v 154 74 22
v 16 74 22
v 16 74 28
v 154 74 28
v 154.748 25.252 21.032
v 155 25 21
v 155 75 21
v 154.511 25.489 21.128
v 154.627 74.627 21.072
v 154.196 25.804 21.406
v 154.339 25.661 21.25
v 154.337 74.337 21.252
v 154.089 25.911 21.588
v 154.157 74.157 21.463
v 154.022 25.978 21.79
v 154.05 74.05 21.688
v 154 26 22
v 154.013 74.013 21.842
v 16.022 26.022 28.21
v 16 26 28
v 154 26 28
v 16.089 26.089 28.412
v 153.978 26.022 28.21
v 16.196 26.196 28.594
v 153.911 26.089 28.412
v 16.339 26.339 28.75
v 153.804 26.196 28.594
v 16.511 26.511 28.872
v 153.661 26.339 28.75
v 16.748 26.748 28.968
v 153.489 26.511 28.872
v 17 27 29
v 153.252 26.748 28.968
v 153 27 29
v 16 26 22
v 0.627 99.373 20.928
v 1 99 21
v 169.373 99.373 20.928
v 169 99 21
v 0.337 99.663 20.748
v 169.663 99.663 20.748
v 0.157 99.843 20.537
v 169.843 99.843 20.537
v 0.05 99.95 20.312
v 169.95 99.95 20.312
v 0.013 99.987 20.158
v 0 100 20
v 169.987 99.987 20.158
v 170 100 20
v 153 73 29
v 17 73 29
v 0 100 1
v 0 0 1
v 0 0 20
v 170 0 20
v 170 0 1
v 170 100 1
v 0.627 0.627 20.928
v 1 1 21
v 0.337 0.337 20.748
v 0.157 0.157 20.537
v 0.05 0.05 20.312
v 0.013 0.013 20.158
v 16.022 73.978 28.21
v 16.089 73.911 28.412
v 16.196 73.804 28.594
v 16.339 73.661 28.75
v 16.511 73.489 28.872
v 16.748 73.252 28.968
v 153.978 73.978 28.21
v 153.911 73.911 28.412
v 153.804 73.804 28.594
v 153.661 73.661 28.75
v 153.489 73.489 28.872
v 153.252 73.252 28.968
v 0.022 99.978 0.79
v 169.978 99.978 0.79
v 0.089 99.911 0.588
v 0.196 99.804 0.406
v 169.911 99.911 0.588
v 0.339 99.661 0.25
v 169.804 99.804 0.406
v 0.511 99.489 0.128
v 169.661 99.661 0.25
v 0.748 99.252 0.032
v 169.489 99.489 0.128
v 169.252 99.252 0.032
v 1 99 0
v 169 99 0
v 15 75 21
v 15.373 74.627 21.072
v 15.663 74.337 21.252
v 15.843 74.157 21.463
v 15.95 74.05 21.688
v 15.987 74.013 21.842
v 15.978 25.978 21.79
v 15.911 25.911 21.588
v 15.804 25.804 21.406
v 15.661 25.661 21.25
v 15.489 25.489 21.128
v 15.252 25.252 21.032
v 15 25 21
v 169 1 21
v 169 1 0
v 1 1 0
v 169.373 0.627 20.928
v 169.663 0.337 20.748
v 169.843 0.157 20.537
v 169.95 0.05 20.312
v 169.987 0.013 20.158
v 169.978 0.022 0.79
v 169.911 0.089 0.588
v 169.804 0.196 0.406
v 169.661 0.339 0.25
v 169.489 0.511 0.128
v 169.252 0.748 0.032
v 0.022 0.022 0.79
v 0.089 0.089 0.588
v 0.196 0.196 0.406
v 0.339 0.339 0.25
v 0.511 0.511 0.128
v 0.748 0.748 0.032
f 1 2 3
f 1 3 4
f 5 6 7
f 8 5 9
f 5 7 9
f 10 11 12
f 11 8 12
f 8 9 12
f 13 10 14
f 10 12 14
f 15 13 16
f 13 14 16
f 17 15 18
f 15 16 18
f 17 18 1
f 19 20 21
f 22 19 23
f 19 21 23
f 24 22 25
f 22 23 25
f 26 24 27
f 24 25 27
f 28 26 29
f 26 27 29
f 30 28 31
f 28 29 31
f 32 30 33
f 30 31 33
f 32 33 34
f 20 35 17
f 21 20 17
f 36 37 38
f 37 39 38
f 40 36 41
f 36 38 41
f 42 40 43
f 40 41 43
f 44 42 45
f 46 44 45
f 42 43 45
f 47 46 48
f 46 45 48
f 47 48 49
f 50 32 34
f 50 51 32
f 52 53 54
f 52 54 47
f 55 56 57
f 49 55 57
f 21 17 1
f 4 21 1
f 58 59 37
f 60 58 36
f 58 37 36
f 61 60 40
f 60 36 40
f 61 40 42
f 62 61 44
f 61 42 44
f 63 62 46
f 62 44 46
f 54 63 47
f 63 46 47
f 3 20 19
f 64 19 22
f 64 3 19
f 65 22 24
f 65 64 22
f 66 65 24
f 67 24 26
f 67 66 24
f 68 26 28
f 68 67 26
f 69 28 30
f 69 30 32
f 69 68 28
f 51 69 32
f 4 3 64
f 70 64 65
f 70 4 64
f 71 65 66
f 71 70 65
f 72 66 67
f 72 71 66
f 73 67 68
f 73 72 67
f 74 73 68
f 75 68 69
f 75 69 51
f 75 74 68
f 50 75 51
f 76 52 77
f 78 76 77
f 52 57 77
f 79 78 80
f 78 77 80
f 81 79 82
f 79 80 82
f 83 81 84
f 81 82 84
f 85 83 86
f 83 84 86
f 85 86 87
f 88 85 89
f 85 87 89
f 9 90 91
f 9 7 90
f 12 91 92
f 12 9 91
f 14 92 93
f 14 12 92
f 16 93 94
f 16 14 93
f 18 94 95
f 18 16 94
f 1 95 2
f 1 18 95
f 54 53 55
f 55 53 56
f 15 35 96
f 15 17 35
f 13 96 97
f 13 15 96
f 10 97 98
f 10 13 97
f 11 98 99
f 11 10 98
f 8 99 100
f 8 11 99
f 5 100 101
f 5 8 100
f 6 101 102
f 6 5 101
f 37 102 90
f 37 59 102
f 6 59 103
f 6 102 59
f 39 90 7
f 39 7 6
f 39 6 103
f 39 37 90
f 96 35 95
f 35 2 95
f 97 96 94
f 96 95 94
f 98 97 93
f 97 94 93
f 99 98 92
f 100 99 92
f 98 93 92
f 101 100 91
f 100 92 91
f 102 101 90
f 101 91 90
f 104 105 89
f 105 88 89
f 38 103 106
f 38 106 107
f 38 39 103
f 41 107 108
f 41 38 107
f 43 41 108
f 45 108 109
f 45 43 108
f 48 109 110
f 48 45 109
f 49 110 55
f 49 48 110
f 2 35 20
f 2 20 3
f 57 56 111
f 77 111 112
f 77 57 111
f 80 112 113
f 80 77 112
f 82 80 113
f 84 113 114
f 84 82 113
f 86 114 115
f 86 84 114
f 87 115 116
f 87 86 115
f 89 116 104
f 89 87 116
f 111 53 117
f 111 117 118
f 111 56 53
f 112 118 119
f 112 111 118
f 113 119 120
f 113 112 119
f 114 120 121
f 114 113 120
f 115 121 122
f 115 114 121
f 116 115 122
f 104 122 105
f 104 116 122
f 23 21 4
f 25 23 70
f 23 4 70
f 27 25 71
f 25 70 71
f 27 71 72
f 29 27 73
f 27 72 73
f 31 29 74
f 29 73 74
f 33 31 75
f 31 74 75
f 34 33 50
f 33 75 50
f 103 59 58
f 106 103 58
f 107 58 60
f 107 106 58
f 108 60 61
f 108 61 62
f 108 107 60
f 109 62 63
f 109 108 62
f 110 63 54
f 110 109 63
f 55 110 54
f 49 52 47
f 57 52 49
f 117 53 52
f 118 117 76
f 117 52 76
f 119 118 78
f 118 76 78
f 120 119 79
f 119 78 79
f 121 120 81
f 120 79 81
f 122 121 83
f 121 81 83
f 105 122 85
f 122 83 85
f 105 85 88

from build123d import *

# Parameters (mm, degrees)
SKETCH_W     = 170
SKETCH_H     = 100
PAD_DEPTH    = 21
SKETCH001_W  = 138
SKETCH001_H  = 48
PAD001_DEPTH = 8
FILLET_R     = 1
FILLET001_R  = 1
FILLET002_R  = 1


with BuildPart() as part:
    # Sketch → Pad (new body)
    with BuildSketch(Plane.XY):
        with Locations((85, 50)):
            Rectangle(SKETCH_W, SKETCH_H)
    extrude(amount=PAD_DEPTH)

    # Sketch001 (on Face6 of Pad) → Pad001 (join)
    with BuildSketch(Plane.XY.offset(21)):
        with Locations((85, 50)):
            Rectangle(SKETCH001_W, SKETCH001_H)
    extrude(amount=PAD001_DEPTH)

    # Fillet
    fillet_edges = [part.edges().sort_by_distance(p)[0] for p in [
        (85, 26, 29),
        (154, 50, 29),
        (85, 74, 29),
        (16, 50, 29),
    ]]
    fillet(fillet_edges, radius=FILLET_R)

    # Fillet001
    fillet001_edges = [part.edges().sort_by_distance(p)[0] for p in [
        (85, 0, 21),
        (0, 50, 21),
        (170, 50, 21),
        (85, 100, 21),
        (85, 26, 21),
        (154, 50, 21),
        (85, 74, 21),
        (16, 50, 21),
    ]]
    fillet(fillet001_edges, radius=FILLET001_R)

    # Fillet002
    fillet002_edges = [part.edges().sort_by_distance(p)[0] for p in [
        (85, 0, 0),
        (170, 50, 0),
        (85, 100, 0),
        (0, 50, 0),
    ]]
    fillet(fillet002_edges, radius=FILLET002_R)


solid = part.part
